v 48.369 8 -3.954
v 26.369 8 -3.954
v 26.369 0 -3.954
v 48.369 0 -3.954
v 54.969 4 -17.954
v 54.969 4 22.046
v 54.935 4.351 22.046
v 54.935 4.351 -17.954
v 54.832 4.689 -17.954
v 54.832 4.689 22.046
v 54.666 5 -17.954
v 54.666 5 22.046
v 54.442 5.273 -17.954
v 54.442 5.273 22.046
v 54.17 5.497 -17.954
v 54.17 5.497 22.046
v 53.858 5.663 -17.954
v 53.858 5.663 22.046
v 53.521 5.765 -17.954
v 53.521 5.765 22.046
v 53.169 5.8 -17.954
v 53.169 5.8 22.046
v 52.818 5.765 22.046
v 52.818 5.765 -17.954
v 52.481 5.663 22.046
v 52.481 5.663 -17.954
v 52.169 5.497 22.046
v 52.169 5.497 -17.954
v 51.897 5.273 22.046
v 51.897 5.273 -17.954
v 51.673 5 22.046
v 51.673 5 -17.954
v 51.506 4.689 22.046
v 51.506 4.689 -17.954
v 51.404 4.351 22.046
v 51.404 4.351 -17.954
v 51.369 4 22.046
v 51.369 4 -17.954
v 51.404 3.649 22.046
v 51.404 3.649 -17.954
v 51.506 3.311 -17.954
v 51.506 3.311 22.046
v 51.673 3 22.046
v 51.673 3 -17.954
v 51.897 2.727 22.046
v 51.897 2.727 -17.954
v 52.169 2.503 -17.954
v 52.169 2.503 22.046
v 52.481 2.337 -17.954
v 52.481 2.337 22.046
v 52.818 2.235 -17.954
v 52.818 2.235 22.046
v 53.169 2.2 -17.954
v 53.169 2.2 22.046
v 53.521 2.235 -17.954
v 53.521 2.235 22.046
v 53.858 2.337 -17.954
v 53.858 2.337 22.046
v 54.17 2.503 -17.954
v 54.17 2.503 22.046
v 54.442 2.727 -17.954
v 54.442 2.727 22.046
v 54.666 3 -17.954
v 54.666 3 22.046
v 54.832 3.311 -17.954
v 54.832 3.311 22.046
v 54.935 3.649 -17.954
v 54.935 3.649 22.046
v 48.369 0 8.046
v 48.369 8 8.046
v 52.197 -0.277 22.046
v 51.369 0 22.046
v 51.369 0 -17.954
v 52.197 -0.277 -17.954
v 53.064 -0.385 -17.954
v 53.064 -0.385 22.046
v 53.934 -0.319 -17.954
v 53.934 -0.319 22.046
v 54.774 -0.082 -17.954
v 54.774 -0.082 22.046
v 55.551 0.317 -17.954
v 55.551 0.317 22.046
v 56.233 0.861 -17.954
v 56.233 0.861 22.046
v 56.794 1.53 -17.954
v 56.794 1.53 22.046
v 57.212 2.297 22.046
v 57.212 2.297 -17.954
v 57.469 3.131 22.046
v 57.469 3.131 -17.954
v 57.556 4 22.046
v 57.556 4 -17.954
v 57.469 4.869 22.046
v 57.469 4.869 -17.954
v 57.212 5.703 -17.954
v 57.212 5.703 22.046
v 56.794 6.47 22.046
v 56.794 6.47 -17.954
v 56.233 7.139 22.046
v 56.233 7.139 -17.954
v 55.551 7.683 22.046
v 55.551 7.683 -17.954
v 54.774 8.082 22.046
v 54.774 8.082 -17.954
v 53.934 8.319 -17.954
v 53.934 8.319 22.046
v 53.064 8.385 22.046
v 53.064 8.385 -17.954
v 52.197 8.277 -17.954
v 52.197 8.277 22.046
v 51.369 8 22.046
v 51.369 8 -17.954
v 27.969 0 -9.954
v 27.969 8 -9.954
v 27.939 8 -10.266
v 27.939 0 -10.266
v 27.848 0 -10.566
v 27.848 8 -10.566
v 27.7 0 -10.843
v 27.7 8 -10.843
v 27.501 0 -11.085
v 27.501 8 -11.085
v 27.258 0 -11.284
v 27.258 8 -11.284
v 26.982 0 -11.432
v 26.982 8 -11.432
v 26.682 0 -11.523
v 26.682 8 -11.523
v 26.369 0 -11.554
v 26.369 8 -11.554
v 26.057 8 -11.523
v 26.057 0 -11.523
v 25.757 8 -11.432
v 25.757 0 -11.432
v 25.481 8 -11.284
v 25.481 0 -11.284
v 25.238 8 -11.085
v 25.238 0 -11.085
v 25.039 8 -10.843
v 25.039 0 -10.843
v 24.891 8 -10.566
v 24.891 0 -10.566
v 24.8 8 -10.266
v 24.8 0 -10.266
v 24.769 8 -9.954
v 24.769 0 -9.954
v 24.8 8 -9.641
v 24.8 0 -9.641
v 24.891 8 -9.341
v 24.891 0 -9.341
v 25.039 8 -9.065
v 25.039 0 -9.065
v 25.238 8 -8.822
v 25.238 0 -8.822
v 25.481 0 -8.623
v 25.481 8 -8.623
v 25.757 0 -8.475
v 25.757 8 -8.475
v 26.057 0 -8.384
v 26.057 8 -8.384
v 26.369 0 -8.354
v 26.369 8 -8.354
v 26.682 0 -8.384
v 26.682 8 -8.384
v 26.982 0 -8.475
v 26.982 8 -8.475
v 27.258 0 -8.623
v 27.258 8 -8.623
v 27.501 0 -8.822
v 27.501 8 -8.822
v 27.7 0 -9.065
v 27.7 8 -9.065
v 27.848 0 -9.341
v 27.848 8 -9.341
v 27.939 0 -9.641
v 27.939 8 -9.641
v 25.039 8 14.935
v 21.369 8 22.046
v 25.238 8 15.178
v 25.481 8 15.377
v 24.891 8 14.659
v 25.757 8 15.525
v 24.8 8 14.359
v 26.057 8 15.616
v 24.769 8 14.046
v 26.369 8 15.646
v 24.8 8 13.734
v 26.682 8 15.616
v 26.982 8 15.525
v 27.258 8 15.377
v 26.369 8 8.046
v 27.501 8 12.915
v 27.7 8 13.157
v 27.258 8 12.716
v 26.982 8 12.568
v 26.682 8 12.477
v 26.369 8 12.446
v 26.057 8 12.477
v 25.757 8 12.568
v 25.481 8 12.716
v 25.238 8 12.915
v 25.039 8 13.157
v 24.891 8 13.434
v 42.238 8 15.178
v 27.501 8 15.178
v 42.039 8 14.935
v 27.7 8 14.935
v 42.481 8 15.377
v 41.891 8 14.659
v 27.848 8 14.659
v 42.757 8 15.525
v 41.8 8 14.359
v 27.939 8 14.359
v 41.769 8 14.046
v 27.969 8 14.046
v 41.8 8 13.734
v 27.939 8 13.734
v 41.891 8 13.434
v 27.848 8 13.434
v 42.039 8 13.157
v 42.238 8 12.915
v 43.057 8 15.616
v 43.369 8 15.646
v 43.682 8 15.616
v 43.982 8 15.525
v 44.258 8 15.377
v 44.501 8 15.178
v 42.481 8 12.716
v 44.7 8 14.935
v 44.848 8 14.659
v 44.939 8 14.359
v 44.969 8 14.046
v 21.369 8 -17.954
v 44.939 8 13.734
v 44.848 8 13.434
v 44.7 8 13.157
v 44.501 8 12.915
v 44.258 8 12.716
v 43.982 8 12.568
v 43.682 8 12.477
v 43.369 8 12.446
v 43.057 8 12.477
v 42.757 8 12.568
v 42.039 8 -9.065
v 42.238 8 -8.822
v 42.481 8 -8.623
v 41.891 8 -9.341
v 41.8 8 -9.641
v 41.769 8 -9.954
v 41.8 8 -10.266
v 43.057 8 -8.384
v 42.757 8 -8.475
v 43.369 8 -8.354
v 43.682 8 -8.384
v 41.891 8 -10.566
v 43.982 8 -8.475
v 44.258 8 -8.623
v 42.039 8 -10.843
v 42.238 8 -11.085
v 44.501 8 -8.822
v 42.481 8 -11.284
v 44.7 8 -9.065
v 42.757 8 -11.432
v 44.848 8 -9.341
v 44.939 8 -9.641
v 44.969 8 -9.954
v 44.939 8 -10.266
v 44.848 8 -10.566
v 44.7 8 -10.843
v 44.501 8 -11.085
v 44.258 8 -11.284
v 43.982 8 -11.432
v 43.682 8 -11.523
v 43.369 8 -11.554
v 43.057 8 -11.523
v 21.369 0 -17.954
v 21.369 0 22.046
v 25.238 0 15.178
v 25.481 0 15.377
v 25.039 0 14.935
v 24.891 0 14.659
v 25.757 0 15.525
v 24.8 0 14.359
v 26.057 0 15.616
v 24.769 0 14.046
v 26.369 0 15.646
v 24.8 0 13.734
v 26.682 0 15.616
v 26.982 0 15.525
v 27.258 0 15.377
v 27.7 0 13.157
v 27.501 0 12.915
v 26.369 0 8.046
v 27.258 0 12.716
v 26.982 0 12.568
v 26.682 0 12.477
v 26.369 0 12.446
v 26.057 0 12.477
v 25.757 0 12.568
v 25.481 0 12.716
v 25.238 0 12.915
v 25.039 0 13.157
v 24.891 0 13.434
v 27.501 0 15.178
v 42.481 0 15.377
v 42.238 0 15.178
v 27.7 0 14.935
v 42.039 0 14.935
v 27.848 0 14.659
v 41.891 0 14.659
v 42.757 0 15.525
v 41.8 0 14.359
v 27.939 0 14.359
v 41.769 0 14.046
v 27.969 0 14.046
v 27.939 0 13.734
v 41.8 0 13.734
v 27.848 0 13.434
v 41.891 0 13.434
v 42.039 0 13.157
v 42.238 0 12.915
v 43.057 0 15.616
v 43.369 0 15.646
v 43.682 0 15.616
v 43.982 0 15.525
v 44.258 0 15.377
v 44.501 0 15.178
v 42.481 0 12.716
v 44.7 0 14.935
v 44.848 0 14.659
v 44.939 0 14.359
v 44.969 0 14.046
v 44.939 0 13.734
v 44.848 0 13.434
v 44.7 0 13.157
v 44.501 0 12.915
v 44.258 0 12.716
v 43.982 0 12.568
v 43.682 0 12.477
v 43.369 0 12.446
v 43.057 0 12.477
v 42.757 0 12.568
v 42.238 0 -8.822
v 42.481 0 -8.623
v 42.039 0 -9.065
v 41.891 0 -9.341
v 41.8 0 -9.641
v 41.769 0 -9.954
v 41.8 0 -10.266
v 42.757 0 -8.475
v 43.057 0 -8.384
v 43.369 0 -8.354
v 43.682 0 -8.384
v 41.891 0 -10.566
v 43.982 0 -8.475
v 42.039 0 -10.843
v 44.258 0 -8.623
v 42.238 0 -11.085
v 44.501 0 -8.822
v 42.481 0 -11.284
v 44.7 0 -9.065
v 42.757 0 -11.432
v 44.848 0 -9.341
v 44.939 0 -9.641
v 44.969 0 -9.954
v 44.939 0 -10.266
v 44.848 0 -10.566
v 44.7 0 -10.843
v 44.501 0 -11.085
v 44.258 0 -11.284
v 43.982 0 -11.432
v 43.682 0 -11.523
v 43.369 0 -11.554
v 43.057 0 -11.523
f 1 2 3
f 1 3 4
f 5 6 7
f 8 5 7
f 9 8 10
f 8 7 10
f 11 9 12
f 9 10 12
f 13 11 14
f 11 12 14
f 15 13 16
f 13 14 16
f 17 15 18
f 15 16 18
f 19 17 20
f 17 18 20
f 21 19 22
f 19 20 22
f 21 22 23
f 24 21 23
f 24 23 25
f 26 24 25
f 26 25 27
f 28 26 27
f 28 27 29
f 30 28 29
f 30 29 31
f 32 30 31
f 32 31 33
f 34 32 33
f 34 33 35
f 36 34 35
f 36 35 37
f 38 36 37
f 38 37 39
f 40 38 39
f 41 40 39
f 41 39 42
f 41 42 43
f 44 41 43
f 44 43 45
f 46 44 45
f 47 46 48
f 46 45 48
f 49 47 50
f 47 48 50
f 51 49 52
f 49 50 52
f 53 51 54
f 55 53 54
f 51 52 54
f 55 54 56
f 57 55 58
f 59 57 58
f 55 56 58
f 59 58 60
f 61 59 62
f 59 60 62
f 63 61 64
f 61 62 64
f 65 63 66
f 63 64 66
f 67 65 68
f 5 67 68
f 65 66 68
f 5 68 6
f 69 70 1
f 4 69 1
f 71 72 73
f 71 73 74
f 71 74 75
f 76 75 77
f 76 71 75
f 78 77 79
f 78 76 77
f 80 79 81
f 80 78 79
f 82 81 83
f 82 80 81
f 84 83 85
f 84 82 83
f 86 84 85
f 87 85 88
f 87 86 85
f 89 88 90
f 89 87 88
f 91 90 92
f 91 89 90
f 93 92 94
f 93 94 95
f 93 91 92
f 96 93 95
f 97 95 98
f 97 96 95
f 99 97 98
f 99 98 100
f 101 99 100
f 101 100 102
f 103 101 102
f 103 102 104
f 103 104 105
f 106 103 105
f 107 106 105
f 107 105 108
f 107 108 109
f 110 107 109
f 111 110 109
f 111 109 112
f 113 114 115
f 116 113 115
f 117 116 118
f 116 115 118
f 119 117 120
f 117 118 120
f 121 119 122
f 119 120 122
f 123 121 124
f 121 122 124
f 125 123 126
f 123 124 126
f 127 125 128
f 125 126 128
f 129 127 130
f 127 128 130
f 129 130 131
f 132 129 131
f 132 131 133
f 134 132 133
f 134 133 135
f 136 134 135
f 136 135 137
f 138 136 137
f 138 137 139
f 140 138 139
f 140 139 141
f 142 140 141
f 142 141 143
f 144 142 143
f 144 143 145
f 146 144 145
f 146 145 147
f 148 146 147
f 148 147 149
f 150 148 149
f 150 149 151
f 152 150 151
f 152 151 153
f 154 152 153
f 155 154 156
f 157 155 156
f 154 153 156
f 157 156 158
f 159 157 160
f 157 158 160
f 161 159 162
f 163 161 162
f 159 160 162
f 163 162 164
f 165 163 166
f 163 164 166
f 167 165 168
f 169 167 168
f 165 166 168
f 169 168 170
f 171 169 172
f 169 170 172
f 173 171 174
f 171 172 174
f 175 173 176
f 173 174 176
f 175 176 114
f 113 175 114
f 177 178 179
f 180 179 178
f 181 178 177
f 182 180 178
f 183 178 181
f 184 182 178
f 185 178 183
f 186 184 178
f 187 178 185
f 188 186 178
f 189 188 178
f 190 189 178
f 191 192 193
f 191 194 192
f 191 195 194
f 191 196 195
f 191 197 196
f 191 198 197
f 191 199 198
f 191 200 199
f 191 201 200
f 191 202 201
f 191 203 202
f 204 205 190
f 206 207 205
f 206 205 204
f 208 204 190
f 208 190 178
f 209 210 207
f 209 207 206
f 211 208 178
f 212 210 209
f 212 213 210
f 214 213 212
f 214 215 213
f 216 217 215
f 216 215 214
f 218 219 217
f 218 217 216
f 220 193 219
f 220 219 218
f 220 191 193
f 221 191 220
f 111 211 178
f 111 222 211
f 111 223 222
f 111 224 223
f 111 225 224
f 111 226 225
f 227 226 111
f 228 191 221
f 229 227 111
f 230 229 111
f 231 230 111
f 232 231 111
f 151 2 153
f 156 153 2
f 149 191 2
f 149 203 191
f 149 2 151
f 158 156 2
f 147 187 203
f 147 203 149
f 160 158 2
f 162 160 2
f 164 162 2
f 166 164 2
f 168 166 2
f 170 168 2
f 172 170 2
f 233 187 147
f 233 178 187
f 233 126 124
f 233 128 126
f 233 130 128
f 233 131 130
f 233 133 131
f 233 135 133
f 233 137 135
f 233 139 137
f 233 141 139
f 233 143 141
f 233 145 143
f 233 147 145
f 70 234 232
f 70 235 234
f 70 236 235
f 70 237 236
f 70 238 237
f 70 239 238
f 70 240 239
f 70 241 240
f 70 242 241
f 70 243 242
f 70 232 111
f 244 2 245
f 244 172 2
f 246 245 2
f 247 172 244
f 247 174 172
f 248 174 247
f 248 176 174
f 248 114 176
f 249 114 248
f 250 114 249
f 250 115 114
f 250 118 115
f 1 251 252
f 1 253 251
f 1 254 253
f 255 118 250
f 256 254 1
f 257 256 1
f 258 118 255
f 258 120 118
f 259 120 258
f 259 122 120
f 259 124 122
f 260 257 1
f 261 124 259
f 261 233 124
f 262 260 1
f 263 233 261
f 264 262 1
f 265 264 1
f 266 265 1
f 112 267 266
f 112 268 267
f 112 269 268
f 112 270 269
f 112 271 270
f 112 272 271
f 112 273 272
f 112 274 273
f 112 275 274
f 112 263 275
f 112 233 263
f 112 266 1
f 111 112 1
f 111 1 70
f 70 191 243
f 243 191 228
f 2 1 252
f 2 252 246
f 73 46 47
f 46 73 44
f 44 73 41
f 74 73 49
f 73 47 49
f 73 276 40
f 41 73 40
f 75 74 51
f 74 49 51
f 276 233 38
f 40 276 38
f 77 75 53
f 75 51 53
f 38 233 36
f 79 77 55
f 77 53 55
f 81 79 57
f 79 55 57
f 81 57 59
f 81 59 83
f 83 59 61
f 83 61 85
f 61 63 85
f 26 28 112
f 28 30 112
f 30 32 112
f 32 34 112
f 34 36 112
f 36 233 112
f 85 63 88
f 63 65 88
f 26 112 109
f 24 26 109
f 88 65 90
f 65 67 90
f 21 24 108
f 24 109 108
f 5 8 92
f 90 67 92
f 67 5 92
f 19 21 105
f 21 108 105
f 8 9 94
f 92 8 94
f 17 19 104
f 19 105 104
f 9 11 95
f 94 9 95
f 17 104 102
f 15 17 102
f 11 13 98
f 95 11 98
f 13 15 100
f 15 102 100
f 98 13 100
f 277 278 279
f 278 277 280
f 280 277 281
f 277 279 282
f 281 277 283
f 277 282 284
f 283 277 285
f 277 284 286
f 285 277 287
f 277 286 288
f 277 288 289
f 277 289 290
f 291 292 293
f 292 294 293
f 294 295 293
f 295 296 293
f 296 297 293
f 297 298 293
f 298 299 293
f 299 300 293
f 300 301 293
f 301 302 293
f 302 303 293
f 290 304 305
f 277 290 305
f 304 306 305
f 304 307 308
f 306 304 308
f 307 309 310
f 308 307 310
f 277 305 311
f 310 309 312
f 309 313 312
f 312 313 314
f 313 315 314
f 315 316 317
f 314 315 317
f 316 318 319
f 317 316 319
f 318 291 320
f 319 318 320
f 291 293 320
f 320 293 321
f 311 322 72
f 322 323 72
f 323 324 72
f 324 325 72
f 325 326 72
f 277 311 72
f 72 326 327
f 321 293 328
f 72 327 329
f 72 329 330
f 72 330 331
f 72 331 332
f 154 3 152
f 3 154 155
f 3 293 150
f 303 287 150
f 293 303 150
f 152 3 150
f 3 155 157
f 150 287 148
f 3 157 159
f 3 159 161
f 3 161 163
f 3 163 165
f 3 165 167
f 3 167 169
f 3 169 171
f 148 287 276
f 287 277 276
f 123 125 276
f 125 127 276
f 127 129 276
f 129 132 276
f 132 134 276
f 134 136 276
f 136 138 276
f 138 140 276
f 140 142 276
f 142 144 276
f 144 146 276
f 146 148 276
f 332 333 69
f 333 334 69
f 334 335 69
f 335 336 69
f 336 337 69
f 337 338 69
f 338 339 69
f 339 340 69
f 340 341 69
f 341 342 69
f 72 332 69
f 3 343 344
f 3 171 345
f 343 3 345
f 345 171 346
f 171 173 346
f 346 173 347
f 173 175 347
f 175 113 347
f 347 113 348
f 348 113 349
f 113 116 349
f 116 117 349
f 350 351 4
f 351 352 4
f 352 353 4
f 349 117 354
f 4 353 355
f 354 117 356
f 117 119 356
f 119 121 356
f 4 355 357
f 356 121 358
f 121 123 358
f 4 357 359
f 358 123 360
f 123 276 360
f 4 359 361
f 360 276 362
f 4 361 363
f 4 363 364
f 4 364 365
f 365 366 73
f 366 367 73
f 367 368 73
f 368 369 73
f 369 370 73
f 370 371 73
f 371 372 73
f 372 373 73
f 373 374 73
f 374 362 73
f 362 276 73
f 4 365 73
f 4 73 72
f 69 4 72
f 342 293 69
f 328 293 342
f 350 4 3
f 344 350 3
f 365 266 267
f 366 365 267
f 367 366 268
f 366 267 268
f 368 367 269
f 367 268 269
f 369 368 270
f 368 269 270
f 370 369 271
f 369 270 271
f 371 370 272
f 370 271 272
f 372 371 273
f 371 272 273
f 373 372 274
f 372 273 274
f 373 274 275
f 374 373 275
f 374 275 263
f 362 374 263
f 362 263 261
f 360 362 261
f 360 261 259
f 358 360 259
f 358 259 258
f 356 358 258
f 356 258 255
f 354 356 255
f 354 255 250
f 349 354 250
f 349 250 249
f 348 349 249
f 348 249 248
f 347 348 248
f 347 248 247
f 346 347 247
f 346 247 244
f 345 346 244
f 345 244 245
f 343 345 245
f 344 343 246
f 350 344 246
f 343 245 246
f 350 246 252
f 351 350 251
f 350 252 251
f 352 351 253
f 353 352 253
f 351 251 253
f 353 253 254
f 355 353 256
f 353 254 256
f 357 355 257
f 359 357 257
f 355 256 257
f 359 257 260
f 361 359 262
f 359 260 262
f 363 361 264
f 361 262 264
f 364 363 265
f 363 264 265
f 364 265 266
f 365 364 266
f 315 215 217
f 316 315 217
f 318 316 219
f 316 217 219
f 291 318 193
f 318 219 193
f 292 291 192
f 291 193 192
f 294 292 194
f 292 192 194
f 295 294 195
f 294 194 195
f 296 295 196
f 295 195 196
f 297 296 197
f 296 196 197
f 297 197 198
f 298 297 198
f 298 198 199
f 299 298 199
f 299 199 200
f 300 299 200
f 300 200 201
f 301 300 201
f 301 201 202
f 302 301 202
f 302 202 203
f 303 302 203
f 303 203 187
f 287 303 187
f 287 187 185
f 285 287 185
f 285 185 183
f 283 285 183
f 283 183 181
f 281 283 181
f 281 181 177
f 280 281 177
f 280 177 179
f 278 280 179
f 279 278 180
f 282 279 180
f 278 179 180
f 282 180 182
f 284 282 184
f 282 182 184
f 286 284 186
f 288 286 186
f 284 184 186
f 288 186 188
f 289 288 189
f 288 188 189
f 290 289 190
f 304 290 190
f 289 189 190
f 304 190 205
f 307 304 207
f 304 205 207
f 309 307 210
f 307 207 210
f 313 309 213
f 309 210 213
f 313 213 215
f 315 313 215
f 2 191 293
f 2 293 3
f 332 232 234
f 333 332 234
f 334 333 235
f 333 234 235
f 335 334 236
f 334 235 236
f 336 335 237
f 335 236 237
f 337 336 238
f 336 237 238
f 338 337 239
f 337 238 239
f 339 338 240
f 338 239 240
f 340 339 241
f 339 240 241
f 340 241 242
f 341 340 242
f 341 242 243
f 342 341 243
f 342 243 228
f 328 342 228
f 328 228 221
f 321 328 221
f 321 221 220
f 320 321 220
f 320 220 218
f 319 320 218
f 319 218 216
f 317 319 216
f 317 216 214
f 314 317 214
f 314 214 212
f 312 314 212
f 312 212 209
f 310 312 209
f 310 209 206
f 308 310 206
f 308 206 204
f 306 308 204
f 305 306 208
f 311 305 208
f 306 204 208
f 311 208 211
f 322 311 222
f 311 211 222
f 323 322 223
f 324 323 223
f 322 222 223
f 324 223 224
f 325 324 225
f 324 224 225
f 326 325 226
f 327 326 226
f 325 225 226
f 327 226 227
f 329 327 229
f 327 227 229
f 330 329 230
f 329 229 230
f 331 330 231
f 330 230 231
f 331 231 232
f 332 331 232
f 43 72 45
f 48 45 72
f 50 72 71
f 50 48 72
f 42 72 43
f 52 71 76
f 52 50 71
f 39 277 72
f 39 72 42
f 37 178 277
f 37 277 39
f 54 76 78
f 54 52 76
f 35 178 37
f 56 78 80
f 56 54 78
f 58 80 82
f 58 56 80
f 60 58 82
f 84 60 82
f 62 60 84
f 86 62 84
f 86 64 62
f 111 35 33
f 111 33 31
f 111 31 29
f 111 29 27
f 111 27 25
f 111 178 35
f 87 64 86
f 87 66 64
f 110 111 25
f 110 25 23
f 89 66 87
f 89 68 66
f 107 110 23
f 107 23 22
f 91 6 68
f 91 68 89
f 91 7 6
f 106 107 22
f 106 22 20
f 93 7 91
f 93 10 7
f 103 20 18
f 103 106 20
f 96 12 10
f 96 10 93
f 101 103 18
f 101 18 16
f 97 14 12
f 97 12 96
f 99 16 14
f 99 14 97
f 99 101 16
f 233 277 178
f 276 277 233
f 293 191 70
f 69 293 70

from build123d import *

# Parameters (mm, degrees)
SKETCH_1_W          = 30
SKETCH_1_H          = 40
EXTRUDE_1_DEPTH     = 8
SKETCH_2_R          = 4.38634244
SKETCH_2_R_2        = 1.8
EXTRUDE_2_DEPTH     = 40
SKETCH_3_R          = 1.6
CUT_EXTRUDE_1_DEPTH = 9.38634244
SKETCH_4_W          = 22
SKETCH_4_H          = 12
CUT_EXTRUDE_2_DEPTH = 9.38634244


with BuildPart() as part:
    # 草图1 → 凸台-拉伸1 (new body)
    with BuildSketch(Plane(origin=(0, 0, 0), x_dir=(1, 0, 0), z_dir=(0, 1, 0))):
        with Locations((36.36947716, -2.04637122)):
            Rectangle(SKETCH_1_W, SKETCH_1_H)
    extrude(amount=EXTRUDE_1_DEPTH)

    # 草图2 → 凸台-拉伸2 (add)
    with BuildSketch(Plane.XY.offset(22.04637122)):
        with Locations((53.16947716, 4)):
            Circle(SKETCH_2_R)
        with Locations((53.16947716, 4)):
            Circle(SKETCH_2_R_2, mode=Mode.SUBTRACT)
    extrude(amount=-EXTRUDE_2_DEPTH)

    # 草图3 → 切除-拉伸1 (cut, through all)
    with BuildSketch(Plane(origin=(0, 8, 0), x_dir=(1, 0, 0), z_dir=(0, 1, 0))):
        with Locations((26.36947716, 9.95362878)):
            Circle(SKETCH_3_R)
        with Locations((43.36947716, 9.95362878)):
            Circle(SKETCH_3_R)
        with Locations((43.36947716, -14.04637122)):
            Circle(SKETCH_3_R)
        with Locations((26.36947716, -14.04637122)):
            Circle(SKETCH_3_R)
    extrude(amount=-CUT_EXTRUDE_1_DEPTH, mode=Mode.SUBTRACT)

    # 草图4 → 切除-拉伸2 (cut, through all)
    with BuildSketch(Plane(origin=(0, 8, 0), x_dir=(1, 0, 0), z_dir=(0, 1, 0))):
        with Locations((37.36947716, -2.04637122)):
            Rectangle(SKETCH_4_W, SKETCH_4_H)
    extrude(amount=-CUT_EXTRUDE_2_DEPTH, mode=Mode.SUBTRACT)


solid = part.part
